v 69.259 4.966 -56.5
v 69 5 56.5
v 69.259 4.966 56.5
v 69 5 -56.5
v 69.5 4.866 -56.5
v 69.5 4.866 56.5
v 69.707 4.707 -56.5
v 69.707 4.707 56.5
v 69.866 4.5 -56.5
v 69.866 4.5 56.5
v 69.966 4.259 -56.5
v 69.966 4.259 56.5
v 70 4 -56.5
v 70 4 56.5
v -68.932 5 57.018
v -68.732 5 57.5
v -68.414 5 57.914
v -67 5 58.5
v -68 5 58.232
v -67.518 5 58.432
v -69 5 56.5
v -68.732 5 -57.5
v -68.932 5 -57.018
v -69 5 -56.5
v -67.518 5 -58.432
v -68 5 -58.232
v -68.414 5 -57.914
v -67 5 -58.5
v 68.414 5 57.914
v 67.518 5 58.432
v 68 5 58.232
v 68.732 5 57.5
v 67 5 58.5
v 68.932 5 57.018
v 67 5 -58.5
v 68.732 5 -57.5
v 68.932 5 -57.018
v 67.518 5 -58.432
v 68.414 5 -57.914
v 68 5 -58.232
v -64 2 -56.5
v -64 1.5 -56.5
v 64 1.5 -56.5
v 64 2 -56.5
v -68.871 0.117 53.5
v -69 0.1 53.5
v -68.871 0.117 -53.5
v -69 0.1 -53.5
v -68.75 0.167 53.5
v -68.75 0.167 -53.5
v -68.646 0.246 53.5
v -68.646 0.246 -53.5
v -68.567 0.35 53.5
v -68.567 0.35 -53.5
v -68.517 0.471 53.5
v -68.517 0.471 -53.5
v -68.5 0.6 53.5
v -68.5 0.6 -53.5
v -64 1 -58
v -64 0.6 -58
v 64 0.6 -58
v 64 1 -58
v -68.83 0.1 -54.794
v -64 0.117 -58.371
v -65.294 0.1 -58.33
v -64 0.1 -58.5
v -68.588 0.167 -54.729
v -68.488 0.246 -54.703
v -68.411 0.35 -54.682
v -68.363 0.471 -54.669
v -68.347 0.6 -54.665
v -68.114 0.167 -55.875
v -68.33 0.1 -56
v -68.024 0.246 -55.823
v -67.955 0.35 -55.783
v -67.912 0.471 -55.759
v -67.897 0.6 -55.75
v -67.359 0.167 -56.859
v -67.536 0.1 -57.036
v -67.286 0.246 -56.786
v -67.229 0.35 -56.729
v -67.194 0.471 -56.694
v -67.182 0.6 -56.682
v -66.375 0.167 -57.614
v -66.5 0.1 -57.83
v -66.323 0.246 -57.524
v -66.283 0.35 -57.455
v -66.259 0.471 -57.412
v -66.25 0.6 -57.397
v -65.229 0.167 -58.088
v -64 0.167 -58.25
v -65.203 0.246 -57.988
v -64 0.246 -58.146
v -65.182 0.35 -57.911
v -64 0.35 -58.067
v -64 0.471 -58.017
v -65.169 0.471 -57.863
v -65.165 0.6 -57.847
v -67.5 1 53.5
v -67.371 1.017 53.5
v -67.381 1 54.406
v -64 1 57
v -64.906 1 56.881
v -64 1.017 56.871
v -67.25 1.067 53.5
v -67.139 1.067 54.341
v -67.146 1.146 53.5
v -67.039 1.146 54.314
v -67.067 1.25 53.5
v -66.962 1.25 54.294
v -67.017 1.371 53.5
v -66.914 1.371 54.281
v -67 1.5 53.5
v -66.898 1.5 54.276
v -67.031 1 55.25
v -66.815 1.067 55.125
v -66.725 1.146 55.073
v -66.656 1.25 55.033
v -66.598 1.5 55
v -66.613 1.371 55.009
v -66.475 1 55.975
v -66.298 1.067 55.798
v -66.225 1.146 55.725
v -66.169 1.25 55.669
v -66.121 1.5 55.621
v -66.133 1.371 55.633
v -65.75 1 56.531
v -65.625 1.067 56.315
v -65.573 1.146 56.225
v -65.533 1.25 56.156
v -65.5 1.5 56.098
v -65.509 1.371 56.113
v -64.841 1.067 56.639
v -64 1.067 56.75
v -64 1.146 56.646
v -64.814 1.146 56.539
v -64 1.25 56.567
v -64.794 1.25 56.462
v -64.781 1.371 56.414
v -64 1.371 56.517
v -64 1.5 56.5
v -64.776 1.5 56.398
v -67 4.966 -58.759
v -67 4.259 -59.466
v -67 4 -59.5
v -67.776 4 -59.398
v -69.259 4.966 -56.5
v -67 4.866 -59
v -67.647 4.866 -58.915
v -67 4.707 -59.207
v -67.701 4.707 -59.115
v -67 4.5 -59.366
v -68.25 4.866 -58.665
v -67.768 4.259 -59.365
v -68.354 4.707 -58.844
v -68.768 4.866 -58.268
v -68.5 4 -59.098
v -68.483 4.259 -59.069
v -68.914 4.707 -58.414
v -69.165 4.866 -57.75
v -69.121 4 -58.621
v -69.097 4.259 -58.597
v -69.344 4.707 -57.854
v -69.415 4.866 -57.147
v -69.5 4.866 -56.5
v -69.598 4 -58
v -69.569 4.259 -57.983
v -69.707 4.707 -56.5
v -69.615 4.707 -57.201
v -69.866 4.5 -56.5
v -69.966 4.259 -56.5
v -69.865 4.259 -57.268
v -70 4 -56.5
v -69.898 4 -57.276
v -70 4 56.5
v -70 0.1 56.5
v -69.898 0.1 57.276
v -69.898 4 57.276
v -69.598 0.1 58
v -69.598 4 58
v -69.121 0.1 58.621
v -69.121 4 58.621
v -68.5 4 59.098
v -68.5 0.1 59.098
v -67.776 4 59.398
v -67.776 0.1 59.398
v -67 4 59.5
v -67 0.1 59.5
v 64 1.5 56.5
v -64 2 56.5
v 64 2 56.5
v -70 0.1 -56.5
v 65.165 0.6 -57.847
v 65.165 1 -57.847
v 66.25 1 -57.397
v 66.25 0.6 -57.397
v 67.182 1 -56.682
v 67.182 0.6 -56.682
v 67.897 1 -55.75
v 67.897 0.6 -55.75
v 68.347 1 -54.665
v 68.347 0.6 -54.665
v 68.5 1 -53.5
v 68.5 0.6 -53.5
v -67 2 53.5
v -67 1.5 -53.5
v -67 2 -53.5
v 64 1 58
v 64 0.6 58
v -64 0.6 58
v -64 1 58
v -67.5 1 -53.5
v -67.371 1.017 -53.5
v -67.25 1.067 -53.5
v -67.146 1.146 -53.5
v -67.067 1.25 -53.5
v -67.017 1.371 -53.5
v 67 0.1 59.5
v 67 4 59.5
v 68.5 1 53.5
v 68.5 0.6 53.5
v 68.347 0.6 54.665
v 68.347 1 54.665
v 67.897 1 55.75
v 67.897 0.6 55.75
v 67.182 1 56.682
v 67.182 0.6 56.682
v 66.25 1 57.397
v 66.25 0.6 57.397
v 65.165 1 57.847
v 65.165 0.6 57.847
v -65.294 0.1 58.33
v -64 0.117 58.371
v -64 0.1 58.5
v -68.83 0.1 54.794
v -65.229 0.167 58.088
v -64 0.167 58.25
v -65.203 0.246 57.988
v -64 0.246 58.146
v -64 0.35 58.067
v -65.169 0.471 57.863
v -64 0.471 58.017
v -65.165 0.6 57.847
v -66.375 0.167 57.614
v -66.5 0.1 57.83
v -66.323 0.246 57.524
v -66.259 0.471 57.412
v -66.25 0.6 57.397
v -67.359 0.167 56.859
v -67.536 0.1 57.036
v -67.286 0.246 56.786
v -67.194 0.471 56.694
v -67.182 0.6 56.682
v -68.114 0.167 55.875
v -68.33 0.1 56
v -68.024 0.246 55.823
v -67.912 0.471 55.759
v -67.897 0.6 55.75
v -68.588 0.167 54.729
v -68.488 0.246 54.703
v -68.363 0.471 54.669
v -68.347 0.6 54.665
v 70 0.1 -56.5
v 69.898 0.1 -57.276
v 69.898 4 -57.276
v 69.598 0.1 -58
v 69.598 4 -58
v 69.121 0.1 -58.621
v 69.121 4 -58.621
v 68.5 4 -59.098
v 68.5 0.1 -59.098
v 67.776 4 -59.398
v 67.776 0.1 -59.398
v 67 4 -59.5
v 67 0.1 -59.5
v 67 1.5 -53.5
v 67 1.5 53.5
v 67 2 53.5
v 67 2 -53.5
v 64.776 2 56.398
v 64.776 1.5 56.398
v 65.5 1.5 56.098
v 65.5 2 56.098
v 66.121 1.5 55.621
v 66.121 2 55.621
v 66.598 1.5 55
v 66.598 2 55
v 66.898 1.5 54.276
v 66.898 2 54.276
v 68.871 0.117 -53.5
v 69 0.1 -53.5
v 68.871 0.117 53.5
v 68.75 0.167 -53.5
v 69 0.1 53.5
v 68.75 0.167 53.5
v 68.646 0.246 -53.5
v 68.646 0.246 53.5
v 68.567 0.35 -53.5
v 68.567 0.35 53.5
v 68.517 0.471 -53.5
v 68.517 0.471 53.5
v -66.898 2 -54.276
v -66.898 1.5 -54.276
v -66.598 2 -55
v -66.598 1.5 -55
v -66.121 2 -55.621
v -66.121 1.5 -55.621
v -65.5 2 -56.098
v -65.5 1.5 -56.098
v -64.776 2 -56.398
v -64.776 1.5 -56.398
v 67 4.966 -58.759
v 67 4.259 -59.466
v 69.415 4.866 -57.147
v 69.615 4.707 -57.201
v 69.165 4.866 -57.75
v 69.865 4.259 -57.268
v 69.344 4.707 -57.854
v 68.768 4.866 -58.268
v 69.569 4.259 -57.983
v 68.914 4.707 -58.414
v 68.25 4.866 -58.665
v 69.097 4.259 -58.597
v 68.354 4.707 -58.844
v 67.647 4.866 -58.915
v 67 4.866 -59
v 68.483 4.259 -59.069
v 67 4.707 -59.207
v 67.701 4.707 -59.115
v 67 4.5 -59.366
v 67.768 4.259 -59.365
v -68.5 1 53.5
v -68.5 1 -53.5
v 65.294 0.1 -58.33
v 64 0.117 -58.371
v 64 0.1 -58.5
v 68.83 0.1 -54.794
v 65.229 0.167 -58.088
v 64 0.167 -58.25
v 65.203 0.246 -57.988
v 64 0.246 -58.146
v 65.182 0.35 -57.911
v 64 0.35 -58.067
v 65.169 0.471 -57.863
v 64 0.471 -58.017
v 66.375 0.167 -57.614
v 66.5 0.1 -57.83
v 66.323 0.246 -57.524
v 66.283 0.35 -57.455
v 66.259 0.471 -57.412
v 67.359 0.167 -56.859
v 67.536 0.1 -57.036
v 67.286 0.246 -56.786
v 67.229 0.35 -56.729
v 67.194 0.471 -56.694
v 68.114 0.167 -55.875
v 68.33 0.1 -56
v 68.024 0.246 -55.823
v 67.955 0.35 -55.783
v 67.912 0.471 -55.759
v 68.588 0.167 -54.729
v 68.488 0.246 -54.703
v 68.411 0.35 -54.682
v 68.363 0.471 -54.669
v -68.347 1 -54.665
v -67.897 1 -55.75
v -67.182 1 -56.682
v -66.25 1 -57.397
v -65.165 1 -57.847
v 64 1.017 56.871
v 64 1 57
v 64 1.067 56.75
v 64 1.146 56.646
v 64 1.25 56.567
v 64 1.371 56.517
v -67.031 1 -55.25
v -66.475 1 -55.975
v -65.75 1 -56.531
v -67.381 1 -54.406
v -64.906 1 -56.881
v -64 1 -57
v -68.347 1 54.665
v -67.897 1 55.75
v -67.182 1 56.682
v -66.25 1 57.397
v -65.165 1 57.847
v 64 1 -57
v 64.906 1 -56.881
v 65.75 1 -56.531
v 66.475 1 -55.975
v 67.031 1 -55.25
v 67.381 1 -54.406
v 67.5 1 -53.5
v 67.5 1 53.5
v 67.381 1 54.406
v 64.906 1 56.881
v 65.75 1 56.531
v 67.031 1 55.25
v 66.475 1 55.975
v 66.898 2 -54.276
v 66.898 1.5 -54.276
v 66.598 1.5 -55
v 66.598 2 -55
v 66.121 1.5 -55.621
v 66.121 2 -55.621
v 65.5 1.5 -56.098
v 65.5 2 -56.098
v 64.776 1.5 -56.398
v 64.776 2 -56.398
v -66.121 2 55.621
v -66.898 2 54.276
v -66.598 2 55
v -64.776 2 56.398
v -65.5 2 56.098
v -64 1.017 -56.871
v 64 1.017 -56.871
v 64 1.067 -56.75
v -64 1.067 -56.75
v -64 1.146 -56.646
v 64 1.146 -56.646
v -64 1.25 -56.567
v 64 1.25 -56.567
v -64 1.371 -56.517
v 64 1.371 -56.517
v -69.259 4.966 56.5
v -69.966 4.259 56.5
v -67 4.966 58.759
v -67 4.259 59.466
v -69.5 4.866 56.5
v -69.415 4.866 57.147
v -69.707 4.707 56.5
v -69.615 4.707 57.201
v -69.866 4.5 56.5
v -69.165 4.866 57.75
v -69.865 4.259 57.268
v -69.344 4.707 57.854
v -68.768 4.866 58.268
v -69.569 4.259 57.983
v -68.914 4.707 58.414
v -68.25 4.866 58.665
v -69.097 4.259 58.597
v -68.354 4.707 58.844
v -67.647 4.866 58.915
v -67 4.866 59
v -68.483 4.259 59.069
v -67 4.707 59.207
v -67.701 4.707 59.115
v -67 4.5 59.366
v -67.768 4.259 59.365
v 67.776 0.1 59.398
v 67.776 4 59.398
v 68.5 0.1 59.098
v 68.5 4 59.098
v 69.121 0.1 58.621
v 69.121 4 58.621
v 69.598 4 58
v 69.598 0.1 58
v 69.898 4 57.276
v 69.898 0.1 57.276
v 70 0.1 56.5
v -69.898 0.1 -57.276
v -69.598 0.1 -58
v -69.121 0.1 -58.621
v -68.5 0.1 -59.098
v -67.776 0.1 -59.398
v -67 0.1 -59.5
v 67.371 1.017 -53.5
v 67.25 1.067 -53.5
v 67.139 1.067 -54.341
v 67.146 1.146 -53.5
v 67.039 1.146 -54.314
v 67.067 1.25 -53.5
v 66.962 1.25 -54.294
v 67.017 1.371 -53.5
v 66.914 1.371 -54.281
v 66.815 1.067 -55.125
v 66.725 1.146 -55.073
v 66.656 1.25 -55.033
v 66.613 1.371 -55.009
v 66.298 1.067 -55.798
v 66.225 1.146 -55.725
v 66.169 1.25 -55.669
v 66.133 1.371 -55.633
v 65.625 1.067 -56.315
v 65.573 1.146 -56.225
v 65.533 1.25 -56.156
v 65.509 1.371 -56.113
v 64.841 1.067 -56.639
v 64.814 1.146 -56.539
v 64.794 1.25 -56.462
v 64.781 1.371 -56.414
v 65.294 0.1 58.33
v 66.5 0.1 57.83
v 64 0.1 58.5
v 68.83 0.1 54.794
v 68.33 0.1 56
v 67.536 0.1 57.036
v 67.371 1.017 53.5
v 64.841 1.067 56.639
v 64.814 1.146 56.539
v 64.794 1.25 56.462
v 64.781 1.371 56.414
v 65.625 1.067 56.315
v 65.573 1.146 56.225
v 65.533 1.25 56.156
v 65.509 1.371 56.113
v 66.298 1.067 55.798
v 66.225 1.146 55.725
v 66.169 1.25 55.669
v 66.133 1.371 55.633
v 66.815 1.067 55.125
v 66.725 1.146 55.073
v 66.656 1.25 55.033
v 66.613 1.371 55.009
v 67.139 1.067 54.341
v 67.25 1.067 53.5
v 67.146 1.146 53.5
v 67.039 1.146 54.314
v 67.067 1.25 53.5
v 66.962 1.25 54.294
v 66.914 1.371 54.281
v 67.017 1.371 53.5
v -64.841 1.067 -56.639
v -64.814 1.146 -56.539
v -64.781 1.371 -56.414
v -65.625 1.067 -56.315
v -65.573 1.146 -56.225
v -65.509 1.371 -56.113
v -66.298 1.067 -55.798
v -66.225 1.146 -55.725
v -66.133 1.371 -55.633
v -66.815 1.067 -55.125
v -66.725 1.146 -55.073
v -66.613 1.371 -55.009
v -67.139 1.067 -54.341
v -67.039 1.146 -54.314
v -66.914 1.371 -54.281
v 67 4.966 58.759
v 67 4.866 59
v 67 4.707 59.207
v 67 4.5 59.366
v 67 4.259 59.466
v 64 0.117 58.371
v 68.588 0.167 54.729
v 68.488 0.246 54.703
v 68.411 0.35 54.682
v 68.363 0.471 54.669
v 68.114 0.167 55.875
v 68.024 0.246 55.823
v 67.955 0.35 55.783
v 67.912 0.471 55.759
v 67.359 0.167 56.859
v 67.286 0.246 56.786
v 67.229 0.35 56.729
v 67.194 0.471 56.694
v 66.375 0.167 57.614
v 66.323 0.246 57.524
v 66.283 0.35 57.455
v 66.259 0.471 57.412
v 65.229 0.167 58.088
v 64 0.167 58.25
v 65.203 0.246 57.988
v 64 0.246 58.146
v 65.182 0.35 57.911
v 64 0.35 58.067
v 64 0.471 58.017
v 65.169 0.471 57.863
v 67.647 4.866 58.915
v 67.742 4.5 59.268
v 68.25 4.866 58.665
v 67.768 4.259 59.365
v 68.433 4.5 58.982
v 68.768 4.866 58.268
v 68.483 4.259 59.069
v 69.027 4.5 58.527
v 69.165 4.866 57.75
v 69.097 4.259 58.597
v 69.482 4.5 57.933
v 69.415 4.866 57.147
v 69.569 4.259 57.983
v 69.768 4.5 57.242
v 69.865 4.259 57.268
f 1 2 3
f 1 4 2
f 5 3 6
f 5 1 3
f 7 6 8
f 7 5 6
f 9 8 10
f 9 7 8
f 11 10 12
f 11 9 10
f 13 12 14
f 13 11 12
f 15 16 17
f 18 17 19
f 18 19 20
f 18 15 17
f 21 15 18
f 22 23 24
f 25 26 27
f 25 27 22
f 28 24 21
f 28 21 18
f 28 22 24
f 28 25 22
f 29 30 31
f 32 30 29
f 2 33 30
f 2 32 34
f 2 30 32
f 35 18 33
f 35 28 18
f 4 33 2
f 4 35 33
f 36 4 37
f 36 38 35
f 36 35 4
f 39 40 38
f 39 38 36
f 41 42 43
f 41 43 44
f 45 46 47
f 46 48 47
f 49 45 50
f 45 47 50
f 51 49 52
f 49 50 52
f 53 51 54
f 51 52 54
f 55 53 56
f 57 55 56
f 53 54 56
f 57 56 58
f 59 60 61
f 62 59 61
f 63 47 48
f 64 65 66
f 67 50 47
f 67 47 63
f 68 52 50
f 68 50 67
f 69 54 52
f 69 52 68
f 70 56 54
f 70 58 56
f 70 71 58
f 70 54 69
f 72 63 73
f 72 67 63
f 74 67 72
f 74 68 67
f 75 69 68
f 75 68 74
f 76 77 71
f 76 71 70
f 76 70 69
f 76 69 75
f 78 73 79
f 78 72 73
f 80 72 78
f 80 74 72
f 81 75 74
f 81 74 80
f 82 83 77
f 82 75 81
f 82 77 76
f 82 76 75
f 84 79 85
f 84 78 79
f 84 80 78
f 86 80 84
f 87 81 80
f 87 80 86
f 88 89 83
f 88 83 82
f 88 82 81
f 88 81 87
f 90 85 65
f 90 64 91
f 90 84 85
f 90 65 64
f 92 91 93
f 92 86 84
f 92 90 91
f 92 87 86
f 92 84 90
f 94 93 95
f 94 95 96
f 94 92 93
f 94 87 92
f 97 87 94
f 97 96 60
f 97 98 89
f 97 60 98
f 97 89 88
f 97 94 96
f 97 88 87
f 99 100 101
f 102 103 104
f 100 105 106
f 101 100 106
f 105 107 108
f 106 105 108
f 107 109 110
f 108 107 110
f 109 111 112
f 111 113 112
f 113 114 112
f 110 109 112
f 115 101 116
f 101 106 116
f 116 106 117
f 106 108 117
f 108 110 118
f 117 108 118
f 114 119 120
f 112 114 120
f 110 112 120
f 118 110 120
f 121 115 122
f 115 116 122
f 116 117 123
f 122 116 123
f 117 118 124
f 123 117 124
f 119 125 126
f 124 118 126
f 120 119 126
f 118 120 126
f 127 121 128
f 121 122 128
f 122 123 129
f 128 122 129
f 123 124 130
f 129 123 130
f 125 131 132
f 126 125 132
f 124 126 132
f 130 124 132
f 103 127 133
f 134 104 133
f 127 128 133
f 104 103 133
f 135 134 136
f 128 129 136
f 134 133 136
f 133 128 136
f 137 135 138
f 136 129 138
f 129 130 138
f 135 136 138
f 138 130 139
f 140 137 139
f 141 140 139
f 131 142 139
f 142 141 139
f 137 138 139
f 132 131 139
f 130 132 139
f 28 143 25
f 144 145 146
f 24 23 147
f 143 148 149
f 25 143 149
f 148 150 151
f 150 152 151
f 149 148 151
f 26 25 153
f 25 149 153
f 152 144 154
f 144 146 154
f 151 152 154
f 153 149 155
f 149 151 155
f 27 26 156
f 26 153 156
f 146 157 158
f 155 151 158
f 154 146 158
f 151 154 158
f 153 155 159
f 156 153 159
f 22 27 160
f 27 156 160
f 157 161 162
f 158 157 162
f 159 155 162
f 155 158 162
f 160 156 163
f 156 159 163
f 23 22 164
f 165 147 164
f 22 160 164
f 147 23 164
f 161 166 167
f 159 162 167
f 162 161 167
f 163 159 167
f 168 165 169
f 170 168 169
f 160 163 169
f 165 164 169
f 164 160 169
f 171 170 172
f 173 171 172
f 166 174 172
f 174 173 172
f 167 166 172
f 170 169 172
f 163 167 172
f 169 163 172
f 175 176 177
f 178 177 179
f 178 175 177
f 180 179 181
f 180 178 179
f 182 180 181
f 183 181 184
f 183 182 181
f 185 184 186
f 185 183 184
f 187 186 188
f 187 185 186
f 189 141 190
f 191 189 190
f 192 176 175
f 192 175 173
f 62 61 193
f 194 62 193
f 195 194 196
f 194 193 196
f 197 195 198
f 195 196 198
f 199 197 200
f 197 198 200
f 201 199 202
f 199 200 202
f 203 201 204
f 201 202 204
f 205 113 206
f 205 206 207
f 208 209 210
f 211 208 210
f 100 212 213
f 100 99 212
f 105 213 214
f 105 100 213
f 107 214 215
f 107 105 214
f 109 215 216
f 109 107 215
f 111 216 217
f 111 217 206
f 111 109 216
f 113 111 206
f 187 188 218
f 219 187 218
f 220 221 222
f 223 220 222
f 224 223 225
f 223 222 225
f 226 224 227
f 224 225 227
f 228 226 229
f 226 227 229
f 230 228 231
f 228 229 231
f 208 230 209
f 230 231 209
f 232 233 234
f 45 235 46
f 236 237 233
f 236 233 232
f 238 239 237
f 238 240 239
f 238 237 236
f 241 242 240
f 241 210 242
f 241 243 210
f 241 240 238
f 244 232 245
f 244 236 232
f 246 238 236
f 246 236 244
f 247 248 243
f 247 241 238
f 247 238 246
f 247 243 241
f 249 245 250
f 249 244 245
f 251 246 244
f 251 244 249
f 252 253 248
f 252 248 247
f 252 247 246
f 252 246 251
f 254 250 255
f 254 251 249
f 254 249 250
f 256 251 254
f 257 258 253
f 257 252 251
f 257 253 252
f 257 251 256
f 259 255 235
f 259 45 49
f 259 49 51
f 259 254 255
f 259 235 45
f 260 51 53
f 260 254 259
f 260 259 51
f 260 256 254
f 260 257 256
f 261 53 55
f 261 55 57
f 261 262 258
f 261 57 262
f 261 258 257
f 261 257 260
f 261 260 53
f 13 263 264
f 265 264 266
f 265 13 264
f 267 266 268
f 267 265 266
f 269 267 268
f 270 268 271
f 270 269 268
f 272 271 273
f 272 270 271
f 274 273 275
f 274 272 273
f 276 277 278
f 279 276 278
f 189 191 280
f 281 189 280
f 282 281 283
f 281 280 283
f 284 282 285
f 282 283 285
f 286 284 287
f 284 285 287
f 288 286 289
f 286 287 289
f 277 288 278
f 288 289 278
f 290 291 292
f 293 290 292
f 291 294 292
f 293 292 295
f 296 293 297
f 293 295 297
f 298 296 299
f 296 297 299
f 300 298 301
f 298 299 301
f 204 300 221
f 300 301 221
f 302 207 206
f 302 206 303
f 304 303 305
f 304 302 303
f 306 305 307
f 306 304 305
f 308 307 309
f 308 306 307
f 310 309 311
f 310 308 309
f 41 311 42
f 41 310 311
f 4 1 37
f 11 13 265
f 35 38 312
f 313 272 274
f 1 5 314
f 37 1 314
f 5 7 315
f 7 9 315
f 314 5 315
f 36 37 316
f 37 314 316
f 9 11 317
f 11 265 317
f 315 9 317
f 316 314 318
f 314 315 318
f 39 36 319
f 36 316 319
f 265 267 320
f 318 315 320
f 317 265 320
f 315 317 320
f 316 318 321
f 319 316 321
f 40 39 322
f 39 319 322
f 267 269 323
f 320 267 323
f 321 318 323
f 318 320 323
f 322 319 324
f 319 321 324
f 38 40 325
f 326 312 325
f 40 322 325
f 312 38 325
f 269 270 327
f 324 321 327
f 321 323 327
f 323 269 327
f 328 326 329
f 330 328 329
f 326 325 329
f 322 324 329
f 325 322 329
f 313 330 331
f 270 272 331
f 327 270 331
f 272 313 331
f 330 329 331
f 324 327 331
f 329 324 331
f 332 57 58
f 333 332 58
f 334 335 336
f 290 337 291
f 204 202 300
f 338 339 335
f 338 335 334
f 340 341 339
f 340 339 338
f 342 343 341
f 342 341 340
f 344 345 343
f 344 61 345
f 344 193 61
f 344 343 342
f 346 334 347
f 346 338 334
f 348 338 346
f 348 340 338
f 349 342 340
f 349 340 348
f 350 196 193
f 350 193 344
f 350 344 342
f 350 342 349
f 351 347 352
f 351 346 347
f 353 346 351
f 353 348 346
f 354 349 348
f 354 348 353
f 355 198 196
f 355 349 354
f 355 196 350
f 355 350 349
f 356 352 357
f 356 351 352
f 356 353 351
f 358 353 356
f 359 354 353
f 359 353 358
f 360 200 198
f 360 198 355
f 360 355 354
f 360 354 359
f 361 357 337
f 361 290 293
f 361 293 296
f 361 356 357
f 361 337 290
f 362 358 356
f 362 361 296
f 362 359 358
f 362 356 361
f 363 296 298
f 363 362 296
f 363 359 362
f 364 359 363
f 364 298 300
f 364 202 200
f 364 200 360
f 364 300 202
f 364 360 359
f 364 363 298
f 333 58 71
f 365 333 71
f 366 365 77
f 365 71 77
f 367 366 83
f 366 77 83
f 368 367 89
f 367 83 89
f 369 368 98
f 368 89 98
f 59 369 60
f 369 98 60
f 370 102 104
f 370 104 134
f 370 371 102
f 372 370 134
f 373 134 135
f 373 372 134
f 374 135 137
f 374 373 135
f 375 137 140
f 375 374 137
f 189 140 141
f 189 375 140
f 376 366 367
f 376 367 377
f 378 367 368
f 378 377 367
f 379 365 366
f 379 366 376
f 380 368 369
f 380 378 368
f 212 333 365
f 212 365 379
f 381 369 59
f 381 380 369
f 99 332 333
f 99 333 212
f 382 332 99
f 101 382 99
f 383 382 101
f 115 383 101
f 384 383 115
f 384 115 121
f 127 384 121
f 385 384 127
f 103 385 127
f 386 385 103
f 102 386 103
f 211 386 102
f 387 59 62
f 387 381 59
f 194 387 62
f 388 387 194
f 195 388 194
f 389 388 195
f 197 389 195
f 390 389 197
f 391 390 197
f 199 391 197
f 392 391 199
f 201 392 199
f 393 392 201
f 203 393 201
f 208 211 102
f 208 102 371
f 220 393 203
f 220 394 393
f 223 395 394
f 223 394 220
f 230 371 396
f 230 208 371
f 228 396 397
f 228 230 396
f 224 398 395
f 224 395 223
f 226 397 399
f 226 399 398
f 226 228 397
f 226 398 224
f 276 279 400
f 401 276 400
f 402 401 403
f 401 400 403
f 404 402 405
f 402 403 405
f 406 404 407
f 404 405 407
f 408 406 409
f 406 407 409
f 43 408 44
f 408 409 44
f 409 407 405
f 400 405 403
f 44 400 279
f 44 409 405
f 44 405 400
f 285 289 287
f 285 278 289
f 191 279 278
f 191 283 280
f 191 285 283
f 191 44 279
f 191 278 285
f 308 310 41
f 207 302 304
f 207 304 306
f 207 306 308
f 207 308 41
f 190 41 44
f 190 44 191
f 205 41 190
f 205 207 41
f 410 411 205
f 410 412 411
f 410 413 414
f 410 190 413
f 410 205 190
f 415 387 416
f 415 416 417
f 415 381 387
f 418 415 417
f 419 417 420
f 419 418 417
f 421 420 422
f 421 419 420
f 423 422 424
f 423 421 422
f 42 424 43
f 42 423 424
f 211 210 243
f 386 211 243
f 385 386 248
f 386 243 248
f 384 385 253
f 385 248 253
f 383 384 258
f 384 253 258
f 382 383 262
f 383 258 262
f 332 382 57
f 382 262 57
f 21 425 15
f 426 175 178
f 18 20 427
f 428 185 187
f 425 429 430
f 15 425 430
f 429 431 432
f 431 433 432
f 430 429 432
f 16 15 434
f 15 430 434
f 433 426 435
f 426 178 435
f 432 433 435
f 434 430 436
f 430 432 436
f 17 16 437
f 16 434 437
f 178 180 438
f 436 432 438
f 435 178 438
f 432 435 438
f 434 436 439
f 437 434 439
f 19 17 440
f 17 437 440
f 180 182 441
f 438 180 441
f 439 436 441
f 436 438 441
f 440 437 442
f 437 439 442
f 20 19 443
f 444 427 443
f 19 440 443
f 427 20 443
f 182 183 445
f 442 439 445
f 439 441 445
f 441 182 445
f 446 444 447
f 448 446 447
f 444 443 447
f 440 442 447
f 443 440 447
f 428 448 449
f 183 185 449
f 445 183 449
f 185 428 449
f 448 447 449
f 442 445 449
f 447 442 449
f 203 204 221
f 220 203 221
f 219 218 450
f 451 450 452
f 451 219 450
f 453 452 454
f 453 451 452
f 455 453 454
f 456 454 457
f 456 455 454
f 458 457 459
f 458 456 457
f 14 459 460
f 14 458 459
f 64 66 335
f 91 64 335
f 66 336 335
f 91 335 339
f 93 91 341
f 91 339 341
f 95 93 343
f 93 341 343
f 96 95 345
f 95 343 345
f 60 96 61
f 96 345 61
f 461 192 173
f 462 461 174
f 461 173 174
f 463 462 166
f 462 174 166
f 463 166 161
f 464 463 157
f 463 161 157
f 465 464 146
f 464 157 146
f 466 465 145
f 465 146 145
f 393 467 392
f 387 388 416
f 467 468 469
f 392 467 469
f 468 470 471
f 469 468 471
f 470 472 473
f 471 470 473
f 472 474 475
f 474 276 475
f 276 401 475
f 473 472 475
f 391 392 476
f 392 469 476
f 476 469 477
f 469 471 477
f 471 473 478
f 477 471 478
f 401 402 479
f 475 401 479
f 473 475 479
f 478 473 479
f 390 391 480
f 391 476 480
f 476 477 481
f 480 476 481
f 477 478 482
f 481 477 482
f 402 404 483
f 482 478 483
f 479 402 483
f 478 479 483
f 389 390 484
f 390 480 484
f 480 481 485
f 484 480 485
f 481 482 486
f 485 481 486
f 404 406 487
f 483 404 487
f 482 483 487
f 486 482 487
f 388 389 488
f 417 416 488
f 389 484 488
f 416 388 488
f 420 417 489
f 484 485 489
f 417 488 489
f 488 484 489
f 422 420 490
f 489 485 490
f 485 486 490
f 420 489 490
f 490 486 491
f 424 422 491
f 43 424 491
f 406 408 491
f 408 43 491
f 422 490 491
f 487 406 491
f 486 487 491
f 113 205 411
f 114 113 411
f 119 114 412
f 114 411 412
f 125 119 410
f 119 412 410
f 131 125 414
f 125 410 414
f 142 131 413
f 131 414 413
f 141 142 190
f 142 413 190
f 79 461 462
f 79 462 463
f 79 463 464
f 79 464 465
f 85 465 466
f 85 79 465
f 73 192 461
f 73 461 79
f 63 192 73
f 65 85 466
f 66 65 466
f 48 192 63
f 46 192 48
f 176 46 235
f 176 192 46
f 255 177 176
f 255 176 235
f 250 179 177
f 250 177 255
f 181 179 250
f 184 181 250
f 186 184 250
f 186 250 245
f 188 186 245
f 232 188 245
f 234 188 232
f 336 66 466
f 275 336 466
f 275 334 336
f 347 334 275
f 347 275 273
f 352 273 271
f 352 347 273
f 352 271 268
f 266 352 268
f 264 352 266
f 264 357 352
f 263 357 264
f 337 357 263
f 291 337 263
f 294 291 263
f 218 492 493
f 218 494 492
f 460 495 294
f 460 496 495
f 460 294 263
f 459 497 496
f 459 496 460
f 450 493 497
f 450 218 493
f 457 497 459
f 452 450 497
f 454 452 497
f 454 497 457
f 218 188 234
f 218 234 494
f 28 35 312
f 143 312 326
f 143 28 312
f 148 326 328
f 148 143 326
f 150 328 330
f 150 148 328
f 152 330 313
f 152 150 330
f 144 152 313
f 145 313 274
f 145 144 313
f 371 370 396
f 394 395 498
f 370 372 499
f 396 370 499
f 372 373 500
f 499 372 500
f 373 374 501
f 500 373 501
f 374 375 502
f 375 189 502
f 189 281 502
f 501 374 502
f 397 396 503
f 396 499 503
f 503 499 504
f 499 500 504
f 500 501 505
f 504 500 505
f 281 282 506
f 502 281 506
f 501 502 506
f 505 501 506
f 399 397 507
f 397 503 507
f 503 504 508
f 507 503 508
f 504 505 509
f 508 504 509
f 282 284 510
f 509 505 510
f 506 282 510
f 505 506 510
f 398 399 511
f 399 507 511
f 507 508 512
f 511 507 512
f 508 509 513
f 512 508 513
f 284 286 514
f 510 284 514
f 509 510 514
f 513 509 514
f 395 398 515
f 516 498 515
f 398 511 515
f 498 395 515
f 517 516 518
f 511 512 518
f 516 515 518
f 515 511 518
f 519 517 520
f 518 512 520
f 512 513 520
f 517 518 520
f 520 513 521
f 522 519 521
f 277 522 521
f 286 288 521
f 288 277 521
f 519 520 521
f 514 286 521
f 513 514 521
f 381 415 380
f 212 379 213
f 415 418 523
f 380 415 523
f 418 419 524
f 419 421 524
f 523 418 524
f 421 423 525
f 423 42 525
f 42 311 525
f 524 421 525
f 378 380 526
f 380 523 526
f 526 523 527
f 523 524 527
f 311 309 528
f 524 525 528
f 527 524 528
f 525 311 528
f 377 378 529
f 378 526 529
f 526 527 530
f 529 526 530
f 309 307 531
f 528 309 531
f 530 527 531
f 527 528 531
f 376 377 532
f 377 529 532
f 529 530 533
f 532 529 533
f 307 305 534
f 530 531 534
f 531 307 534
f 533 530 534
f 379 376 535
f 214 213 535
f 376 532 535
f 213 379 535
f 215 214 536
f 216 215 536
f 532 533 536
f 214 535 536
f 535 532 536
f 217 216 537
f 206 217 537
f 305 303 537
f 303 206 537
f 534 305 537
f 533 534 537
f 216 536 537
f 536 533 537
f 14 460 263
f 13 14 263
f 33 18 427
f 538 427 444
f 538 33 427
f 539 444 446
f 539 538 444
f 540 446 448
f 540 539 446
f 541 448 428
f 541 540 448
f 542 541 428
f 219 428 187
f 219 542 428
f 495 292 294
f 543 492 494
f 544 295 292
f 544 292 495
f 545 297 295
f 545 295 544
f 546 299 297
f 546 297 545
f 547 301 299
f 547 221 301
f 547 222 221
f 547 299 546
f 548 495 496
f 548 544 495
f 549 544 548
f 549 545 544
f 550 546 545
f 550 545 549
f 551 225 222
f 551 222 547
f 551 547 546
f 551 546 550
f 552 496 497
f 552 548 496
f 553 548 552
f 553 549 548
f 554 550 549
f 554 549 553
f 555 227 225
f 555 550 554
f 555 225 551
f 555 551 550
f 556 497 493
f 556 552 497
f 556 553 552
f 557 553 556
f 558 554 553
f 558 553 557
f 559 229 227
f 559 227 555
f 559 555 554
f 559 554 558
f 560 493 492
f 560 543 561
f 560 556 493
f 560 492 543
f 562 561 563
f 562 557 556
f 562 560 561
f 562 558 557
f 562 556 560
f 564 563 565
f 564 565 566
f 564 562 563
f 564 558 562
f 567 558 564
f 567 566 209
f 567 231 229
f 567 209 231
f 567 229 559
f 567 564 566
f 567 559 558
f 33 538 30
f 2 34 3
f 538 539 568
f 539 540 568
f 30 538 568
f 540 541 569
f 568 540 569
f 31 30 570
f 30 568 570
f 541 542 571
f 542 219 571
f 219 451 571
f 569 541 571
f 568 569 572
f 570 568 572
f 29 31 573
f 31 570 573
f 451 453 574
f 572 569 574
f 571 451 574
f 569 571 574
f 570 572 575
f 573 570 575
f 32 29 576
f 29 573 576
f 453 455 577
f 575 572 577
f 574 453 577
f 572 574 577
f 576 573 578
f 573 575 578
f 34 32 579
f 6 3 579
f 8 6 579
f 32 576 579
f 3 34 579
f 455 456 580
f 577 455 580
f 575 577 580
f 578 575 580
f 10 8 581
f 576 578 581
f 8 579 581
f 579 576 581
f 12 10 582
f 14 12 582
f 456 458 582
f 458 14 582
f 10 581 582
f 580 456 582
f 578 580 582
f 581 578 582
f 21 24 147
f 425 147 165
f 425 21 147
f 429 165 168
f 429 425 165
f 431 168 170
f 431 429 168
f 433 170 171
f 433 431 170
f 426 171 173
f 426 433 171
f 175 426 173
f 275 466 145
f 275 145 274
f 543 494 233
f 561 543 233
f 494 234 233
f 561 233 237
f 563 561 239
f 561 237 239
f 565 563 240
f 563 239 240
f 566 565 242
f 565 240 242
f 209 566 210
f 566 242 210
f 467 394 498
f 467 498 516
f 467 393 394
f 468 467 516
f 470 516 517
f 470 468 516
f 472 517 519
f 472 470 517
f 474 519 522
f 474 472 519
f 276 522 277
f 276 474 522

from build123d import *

# Parameters (mm, degrees)
SKETCH1_W           = 140
SKETCH1_H           = 119
BOSS_EXTRUDE1_DEPTH = 5
FILLET1_R           = 3
SHELL1_START        = -67
SHELL1_OUTLINE_W    = 2
SHELL1_OUTLINE_H    = 113
SHELL1_DEPTH        = 134
FILLET2_R           = 3
CUT_EXTRUDE1_DEPTH  = 1
CUT_EXTRUDE2_DEPTH  = 0.1
FILLET3_R           = 1
FILLET5_R           = 0.5


# Read off the part's stored shape, not the designer's step: Shell1
with BuildPart() as part:
    # Sketch1 → Boss-Extrude1 (new body)
    with BuildSketch(Plane(origin=(0, 0, 0), x_dir=(1, 0, 0), z_dir=(0, 1, 0))):
        Rectangle(SKETCH1_W, SKETCH1_H)
    extrude(amount=BOSS_EXTRUDE1_DEPTH)

    # Fillet1
    fillet1_edges = [part.edges().sort_by_distance(p)[0] for p in [
        (70, 2.5, 59.5),
        (-70, 2.5, 59.5),
        (-70, 2.5, -59.5),
        (70, 2.5, -59.5),
    ]]
    fillet(fillet1_edges, radius=FILLET1_R)

    # Shell1 outline → Shell1 (cut)
    with BuildSketch(Plane.YZ.offset(SHELL1_START)):
        with Locations((1, 0)):
            Rectangle(SHELL1_OUTLINE_W, SHELL1_OUTLINE_H)
    extrude(amount=SHELL1_DEPTH, mode=Mode.SUBTRACT)

    # Fillet2
    fillet2_edges = [part.edges().sort_by_distance(p)[0] for p in [
        (67, 1, -56.5),
        (-67, 1, -56.5),
        (-67, 1, 56.5),
        (67, 1, 56.5),
    ]]
    fillet(fillet2_edges, radius=FILLET2_R)

    # Sketch2 → Cut-Extrude1 (cut)
    with BuildSketch(Plane.XZ):
        with BuildLine():
            Line((68.5, -53.5), (68.5, 53.5))
            ThreePointArc((68.5, 53.5), (67.181980515, 56.681980515), (64, 58))
            Line((64, 58), (-64, 58))
            ThreePointArc((-64, 58), (-67.181980515, 56.681980515), (-68.5, 53.5))
            Line((-68.5, 53.5), (-68.5, -53.5))
            ThreePointArc((-68.5, -53.5), (-67.181980515, -56.681980515), (-64, -58))
            Line((-64, -58), (64, -58))
            ThreePointArc((64, -58), (67.181980515, -56.681980515), (68.5, -53.5))
        make_face()
        with BuildLine():
            Line((67, 53.5), (67, -53.5))
            ThreePointArc((67, -53.5), (66.121320344, -55.621320344), (64, -56.5))
            Line((64, -56.5), (-64, -56.5))
            ThreePointArc((-64, -56.5), (-66.121320344, -55.621320344), (-67, -53.5))
            Line((-67, -53.5), (-67, 53.5))
            ThreePointArc((-67, 53.5), (-66.121320344, 55.621320344), (-64, 56.5))
            Line((-64, 56.5), (64, 56.5))
            ThreePointArc((64, 56.5), (66.121320344, 55.621320344), (67, 53.5))
        make_face(mode=Mode.SUBTRACT)
    extrude(amount=-CUT_EXTRUDE1_DEPTH, mode=Mode.SUBTRACT)

    # Sketch3 → Cut-Extrude2 (cut)
    with BuildSketch(Plane.XZ):
        with BuildLine():
            Line((70, -56.5), (70, 56.5))
            ThreePointArc((70, 56.5), (69.121320344, 58.621320344), (67, 59.5))
            Line((67, 59.5), (-67, 59.5))
            ThreePointArc((-67, 59.5), (-69.121320344, 58.621320344), (-70, 56.5))
            Line((-70, 56.5), (-70, -56.5))
            ThreePointArc((-70, -56.5), (-69.121320344, -58.621320344), (-67, -59.5))
            Line((-67, -59.5), (67, -59.5))
            ThreePointArc((67, -59.5), (69.121320344, -58.621320344), (70, -56.5))
        make_face()
        with BuildLine():
            Line((-64, -58), (64, -58))
            ThreePointArc((64, -58), (67.181980515, -56.681980515), (68.5, -53.5))
            Line((68.5, -53.5), (68.5, 53.5))
            ThreePointArc((68.5, 53.5), (67.181980515, 56.681980515), (64, 58))
            Line((64, 58), (-64, 58))
            ThreePointArc((-64, 58), (-67.181980515, 56.681980515), (-68.5, 53.5))
            Line((-68.5, 53.5), (-68.5, -53.5))
            ThreePointArc((-68.5, -53.5), (-67.181980515, -56.681980515), (-64, -58))
        make_face(mode=Mode.SUBTRACT)
    extrude(amount=-CUT_EXTRUDE2_DEPTH, mode=Mode.SUBTRACT)

    # Fillet3
    fillet3_edges = [part.edges().sort_by_distance(p)[0] for p in [
        (70, 5, 0),
        (0, 5, 59.5),
        (0, 5, -59.5),
        (-70, 5, 0),
        (-69.121320344, 5, 58.621320344),
        (69.121320344, 5, -58.621320344),
        (-69.121320344, 5, -58.621320344),
        (69.121320344, 5, 58.621320344),
    ]]
    fillet(fillet3_edges, radius=FILLET3_R)

    # Fillet5
    fillet5_edges = [part.edges().sort_by_distance(p)[0] for p in [
        (-68.5, 0.1, 0),
        (-67.181980515, 0.1, -56.681980515),
        (0, 0.1, -58),
        (67.181980515, 0.1, -56.681980515),
        (68.5, 0.1, 0),
        (67.181980515, 0.1, 56.681980515),
        (0, 0.1, 58),
        (-67.181980515, 0.1, 56.681980515),
        (-67, 1, 0),
        (-66.121320344, 1, -55.621320344),
        (0, 1, -56.5),
        (66.121320344, 1, -55.621320344),
        (67, 1, 0),
        (66.121320344, 1, 55.621320344),
        (0, 1, 56.5),
        (-66.121320344, 1, 55.621320344),
    ]]
    fillet(fillet5_edges, radius=FILLET5_R)


solid = part.part
